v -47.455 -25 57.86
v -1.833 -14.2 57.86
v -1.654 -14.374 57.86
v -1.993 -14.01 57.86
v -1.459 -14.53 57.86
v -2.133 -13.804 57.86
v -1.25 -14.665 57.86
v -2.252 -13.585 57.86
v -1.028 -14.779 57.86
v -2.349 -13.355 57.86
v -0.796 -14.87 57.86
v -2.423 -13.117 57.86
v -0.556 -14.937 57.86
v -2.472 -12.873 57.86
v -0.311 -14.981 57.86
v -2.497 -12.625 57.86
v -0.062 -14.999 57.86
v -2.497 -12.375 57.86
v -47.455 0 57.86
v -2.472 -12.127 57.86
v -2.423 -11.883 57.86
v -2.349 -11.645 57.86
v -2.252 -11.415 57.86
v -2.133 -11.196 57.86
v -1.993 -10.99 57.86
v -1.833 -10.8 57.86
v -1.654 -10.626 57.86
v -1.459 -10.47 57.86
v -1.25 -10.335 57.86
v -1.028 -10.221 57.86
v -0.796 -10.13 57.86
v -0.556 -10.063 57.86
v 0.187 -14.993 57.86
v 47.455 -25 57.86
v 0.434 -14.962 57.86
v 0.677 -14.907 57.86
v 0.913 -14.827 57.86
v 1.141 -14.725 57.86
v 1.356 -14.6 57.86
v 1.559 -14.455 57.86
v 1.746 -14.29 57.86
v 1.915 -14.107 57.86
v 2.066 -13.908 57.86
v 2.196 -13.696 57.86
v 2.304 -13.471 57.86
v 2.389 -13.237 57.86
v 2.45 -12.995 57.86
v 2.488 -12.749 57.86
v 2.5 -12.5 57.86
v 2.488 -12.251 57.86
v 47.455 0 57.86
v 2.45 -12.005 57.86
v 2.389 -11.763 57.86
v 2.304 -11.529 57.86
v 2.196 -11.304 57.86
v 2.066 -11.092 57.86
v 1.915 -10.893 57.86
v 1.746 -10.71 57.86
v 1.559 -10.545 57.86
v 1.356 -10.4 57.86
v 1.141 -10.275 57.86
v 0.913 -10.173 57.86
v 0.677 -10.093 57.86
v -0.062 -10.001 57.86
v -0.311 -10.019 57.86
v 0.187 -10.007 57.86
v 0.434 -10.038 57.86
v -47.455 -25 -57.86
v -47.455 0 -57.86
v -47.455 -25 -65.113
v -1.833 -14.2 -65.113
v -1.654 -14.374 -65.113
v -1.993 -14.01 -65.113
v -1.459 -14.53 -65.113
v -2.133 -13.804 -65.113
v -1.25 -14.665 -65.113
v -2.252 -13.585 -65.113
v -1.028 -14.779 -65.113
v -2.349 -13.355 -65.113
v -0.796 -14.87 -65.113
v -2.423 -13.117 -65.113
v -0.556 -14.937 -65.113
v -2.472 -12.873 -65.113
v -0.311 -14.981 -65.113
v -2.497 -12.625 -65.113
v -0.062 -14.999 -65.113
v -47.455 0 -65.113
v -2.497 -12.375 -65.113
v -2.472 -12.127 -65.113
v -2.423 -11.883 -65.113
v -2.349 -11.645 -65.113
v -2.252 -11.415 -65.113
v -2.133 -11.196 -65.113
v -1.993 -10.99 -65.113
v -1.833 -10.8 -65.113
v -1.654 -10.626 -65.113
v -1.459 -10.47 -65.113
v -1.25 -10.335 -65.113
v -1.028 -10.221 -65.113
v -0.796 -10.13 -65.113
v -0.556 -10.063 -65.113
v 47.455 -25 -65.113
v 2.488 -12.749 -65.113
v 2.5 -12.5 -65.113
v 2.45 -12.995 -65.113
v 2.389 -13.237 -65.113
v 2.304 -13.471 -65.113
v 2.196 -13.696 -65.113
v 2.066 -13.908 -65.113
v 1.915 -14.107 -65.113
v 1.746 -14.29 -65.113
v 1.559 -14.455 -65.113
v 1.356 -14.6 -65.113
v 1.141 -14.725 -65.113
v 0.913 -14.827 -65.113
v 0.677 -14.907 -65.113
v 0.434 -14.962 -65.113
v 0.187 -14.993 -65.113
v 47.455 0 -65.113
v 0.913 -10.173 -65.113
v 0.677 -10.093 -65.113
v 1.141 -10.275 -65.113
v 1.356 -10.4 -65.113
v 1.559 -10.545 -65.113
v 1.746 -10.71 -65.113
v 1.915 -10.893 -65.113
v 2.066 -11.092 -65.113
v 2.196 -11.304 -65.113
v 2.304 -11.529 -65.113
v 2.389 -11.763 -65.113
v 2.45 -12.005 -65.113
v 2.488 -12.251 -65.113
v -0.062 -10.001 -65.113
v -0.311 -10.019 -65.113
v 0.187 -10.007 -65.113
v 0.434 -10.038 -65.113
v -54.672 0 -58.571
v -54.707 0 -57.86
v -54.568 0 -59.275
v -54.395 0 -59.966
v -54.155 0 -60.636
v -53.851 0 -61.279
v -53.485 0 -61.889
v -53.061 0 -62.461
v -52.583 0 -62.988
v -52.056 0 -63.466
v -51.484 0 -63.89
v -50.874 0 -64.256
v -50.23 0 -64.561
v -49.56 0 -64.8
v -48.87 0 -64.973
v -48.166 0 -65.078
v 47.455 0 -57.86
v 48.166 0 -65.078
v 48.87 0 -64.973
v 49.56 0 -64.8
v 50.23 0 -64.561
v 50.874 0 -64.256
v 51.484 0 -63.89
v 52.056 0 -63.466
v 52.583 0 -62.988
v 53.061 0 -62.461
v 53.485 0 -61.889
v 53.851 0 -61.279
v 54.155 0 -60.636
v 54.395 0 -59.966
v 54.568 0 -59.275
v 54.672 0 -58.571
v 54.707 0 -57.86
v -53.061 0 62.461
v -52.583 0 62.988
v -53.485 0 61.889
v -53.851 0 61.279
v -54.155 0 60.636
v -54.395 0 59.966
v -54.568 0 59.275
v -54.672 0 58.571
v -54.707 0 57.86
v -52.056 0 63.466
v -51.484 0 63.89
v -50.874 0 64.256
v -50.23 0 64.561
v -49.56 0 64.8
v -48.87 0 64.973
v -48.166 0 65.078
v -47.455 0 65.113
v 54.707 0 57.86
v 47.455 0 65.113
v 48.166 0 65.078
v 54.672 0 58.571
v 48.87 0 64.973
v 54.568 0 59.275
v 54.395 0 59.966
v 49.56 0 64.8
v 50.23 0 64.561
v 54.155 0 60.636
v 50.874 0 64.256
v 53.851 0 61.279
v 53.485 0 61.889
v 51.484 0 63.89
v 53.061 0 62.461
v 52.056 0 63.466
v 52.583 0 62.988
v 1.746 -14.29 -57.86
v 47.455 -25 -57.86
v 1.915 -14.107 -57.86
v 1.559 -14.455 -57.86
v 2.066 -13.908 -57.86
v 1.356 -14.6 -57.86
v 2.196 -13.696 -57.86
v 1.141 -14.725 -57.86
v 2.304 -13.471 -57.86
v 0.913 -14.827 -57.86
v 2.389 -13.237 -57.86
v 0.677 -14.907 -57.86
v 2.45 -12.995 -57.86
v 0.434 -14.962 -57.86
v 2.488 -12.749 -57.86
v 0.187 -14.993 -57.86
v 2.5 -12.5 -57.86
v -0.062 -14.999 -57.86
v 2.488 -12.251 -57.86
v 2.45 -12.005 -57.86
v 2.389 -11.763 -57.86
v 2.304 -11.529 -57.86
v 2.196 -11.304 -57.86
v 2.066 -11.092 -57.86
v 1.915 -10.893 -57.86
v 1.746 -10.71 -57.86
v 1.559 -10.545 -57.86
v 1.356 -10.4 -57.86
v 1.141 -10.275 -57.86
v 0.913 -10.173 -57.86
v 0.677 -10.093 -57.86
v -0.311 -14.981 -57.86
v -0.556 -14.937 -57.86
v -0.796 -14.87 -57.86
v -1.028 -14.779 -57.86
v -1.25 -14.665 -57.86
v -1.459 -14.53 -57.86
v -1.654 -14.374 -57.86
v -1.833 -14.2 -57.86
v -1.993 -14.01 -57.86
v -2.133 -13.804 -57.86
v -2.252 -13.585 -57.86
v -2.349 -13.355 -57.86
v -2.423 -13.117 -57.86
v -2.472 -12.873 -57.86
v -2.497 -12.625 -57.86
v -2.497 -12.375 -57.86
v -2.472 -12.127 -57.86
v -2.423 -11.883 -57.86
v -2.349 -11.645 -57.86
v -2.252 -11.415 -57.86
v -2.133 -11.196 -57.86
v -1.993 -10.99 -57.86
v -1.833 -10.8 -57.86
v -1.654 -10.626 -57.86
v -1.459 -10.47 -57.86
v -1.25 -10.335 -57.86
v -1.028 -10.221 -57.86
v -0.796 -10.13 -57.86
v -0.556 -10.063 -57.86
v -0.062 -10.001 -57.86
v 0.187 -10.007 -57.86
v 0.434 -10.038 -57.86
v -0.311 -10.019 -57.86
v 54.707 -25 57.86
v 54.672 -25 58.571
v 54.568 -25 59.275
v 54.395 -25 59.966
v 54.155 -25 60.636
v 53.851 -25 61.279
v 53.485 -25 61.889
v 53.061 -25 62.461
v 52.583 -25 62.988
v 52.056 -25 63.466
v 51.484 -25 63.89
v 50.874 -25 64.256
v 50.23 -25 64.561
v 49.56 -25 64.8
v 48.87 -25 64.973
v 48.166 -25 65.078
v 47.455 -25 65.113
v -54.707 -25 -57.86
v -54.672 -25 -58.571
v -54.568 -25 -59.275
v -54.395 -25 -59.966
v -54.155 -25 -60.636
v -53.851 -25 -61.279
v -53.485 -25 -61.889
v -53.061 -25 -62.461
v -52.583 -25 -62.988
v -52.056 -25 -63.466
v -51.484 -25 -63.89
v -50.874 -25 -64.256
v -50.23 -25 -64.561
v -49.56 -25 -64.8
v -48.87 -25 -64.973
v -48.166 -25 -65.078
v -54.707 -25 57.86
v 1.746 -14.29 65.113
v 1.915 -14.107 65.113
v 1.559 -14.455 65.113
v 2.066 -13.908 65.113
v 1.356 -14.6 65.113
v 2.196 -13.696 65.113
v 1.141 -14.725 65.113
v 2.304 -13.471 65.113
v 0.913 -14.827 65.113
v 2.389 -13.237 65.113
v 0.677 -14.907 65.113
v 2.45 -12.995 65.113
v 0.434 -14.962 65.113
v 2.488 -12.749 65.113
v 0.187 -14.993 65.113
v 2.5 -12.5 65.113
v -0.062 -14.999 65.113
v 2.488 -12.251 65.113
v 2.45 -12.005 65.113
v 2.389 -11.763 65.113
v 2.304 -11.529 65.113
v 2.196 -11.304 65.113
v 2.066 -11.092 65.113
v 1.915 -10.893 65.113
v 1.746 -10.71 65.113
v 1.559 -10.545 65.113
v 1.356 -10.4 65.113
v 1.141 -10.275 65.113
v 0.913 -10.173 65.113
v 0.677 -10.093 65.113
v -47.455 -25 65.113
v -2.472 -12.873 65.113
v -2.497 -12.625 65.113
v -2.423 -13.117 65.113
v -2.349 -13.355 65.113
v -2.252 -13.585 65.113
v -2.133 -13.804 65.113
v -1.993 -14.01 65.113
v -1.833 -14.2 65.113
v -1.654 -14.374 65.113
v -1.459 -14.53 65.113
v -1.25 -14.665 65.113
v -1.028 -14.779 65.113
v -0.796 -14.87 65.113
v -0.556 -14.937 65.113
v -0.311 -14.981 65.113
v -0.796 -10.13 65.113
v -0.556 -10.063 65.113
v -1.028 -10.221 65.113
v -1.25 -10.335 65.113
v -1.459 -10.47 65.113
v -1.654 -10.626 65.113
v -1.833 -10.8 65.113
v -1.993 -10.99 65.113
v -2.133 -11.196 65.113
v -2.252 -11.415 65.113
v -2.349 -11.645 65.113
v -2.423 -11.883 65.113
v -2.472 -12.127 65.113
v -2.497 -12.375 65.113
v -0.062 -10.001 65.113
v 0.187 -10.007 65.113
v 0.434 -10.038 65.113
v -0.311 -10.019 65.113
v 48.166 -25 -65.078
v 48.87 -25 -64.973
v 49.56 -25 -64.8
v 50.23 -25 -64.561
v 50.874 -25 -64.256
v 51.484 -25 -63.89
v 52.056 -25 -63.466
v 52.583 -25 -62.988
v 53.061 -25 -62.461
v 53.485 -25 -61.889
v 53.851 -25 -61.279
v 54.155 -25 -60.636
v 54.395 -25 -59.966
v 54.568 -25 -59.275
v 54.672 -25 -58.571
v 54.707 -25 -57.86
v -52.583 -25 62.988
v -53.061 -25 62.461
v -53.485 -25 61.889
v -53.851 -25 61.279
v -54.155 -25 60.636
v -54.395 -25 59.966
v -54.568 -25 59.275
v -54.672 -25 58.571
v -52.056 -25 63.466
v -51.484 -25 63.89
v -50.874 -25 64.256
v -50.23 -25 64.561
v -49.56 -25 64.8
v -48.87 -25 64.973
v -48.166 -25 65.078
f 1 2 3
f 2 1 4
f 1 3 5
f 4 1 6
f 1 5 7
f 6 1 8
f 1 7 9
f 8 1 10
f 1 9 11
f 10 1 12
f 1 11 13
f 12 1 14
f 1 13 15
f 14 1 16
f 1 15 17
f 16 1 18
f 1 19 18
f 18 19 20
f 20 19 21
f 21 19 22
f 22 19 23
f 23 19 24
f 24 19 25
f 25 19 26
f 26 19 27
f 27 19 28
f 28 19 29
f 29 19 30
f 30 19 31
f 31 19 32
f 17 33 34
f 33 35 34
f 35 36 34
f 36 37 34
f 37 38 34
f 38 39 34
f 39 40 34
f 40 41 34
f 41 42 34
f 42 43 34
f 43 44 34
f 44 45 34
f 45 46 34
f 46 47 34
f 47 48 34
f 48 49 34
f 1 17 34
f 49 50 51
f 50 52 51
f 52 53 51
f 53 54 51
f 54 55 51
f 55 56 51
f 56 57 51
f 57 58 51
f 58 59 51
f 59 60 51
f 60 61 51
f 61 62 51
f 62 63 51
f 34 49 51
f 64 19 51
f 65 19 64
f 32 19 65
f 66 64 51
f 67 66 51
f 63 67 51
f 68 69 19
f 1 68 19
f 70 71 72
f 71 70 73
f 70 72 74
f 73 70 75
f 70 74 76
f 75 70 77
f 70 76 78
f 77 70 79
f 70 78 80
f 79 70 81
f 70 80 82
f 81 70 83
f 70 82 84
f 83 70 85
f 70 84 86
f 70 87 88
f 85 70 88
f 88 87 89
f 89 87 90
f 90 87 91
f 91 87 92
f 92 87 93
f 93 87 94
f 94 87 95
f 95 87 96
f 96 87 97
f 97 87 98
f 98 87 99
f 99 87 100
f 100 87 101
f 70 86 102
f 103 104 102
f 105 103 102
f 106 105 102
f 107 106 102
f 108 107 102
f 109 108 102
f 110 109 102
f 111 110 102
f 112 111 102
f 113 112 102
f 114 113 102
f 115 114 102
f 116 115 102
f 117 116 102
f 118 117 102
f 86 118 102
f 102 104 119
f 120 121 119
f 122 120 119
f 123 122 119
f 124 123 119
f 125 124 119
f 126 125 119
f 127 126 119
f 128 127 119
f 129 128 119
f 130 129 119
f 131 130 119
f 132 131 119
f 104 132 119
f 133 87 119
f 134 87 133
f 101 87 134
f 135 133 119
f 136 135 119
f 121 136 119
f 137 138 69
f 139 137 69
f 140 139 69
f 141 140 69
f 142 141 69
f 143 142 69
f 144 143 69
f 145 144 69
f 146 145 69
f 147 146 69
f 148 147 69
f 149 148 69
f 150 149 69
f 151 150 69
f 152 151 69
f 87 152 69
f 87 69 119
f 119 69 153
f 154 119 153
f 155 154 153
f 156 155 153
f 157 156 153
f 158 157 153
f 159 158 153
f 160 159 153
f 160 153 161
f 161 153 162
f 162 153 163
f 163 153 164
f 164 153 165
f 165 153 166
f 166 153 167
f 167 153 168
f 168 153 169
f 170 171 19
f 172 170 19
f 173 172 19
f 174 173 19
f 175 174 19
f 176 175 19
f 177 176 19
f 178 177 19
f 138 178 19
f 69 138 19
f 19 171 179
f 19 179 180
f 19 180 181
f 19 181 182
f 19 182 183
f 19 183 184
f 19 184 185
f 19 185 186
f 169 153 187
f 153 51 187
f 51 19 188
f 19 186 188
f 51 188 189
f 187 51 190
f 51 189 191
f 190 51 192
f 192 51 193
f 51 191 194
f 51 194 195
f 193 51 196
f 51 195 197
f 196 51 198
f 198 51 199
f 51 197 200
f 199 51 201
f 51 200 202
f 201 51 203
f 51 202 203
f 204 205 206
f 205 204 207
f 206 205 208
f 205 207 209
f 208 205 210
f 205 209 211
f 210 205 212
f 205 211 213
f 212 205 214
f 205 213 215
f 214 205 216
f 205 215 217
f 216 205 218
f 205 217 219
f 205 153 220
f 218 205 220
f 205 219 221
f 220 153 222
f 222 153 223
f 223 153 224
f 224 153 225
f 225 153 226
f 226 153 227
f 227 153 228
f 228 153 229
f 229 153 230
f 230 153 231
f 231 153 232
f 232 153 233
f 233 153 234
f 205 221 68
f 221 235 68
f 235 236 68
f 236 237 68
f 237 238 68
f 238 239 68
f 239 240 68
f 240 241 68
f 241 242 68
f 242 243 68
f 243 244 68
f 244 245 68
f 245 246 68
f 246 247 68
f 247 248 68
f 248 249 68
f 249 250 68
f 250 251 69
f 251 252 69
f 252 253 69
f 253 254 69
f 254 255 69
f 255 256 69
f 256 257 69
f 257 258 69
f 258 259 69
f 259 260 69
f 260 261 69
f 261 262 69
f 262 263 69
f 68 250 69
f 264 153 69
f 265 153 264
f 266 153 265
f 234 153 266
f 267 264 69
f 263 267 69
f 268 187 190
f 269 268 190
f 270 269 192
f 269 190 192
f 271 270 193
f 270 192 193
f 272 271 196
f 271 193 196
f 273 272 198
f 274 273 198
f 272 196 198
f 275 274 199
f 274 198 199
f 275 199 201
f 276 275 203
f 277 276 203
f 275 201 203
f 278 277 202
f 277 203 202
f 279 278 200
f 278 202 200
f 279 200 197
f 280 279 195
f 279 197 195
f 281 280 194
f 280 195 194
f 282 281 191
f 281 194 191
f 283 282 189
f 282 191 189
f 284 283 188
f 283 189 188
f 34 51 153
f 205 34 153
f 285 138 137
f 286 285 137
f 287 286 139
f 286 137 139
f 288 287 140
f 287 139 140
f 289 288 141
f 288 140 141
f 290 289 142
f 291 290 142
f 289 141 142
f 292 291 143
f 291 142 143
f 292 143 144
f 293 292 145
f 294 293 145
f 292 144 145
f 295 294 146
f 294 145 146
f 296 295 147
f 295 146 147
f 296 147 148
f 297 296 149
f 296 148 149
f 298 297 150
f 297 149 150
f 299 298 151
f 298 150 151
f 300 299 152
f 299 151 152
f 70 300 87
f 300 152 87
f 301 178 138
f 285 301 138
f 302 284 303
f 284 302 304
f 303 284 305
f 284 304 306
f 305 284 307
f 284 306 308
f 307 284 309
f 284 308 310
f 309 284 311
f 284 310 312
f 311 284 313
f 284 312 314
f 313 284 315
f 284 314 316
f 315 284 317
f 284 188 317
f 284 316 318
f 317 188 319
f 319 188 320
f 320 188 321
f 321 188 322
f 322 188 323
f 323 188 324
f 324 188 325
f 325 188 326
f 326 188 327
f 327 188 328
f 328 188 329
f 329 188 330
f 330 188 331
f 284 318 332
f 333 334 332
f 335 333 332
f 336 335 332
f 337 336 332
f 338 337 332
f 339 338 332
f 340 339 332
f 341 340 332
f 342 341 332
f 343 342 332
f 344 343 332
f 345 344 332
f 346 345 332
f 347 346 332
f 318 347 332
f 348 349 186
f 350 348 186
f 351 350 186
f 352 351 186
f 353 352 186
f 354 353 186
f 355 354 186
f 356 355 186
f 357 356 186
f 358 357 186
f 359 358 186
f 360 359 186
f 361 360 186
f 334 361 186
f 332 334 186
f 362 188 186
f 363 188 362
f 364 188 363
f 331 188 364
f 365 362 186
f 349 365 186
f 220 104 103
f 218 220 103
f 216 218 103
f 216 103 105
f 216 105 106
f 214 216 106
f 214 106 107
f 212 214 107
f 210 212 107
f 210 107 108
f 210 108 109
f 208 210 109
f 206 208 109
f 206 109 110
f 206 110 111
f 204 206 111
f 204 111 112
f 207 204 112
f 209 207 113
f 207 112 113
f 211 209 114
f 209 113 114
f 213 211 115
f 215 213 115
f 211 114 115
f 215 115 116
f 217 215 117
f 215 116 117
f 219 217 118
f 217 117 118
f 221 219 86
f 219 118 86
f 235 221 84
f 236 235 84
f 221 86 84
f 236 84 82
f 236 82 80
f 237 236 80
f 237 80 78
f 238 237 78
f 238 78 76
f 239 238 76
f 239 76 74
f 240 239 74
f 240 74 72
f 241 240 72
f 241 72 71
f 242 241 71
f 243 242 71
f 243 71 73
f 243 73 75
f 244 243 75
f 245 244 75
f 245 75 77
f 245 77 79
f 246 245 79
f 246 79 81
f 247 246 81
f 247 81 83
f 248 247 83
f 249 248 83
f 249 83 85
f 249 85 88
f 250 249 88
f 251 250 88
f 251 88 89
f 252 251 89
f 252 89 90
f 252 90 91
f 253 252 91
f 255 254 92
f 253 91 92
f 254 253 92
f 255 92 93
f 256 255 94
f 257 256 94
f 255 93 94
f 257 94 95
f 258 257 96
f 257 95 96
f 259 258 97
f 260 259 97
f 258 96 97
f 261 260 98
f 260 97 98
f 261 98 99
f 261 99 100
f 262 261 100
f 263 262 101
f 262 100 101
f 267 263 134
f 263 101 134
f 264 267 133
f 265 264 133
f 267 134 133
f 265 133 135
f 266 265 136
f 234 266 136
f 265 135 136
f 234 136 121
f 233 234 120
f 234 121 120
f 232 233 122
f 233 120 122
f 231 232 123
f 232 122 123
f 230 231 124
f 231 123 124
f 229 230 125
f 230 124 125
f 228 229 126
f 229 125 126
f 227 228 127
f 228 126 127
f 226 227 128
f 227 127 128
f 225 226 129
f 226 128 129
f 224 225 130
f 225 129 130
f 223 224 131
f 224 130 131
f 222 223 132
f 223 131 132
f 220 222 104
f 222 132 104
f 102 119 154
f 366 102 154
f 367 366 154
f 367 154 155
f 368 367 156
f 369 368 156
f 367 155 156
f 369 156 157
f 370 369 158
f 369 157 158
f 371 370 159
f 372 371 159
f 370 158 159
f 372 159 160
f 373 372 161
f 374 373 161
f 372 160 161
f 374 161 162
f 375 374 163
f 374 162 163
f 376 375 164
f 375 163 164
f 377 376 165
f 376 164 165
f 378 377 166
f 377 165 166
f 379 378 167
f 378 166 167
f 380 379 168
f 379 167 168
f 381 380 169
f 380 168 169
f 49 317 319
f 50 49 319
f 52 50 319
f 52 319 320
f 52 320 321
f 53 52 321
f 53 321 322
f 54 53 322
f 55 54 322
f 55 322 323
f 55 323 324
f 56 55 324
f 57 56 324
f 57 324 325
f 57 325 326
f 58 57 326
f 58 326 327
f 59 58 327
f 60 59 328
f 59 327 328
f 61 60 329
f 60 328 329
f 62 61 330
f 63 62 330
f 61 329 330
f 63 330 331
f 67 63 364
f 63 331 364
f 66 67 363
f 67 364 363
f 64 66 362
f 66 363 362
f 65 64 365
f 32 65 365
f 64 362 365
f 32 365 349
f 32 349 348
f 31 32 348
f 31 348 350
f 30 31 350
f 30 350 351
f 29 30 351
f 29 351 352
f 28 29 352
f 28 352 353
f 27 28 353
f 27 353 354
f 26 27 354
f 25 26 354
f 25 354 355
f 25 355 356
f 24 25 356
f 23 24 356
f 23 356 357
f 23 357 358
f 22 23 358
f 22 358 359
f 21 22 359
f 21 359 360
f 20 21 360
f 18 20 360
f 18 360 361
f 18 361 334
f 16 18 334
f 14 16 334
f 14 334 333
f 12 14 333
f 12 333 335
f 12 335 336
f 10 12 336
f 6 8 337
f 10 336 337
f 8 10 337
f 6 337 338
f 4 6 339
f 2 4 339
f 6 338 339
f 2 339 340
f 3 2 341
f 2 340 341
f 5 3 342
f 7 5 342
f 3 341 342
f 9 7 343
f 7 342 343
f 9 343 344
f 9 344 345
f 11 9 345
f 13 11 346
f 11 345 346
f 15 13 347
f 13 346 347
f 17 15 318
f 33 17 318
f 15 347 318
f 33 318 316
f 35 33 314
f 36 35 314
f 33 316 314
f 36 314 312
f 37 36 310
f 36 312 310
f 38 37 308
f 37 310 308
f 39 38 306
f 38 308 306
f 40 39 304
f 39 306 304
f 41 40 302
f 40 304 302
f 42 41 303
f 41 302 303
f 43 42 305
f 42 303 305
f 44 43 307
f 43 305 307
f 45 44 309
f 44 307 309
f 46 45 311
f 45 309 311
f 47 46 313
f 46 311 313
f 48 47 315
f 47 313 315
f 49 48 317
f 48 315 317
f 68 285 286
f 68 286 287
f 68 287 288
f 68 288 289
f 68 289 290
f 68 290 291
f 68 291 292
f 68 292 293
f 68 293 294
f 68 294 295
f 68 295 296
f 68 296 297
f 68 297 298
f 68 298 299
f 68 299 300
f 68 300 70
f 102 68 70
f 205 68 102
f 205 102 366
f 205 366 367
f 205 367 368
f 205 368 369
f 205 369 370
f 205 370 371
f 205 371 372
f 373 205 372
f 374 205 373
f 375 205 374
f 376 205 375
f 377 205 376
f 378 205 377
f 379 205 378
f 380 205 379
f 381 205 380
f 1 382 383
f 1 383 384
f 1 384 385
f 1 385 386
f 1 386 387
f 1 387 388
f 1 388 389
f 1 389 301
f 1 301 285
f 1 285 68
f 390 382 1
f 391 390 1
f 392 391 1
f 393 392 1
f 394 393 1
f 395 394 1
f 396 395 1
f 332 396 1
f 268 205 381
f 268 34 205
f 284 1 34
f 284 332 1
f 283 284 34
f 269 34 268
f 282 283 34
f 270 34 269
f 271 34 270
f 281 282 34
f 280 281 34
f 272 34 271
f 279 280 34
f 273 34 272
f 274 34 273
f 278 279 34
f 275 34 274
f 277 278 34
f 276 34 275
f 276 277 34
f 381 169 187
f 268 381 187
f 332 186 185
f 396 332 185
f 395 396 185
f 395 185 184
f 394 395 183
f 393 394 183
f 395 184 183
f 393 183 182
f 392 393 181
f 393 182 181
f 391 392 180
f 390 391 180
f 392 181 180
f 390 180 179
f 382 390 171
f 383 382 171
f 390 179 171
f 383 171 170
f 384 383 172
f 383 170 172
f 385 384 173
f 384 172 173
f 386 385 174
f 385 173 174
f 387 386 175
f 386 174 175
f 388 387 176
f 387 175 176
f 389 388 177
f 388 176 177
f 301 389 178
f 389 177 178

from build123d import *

# Parameters (mm, degrees)
F1_DEPTH = 25
F3_R     = 2.5
F4_DEPTH = 25
F2_R     = 2.5
F5_DEPTH = 25


# Not quite as in the source:
# - ends of sketch curves that miss each other by under 0.0002 mm in the source are joined


with BuildPart() as f1:
    # F0 (on Front) → F1 (new body)
    with BuildSketch(Plane.XZ):
        with BuildLine():
            Line((-47.4549531937, 57.8603595495), (47.4549531937, 57.8603595495))
            Line((47.4549531937, 57.8603595495), (47.4549531937, 65.1126131415))
            Line((47.4549531937, 65.1126131415), (-47.4549531937, 65.1126131415))
            ThreePointArc((-47.4549531937, 65.1126131415), (-52.5830735216, 62.9884798775), (-54.707210511, 57.8603595495))
            Line((-54.707210511, 57.8603595495), (-54.7072067857, -57.8603595495))
            ThreePointArc((-54.7072067857, -57.8603595495), (-52.5830708875, -62.9884772433), (-47.4549531937, -65.1126131415))
            Line((-47.4549531937, -65.1126131415), (-47.4549531937, -57.8603595495))
            Line((-47.4549531937, -57.8603595495), (-47.4549531937, 57.8603595495))
        make_face()
        with BuildLine():
            Line((47.4549531937, 65.1126131415), (47.4549531937, 57.8603595495))
            Line((47.4549531937, 57.8603595495), (47.4549531937, -57.8603595495))
            Line((47.4549531937, -57.8603595495), (-47.4549531937, -57.8603595495))
            Line((-47.4549531937, -57.8603595495), (-47.4549531937, -65.1126131415))
            Line((-47.4549531937, -65.1126131415), (47.4549531937, -65.1126131415))
            ThreePointArc((47.4549531937, -65.1126131415), (52.5830735216, -62.9884798775), (54.707210511, -57.8603595495))
            Line((54.707210511, -57.8603595495), (54.7072067857, 57.8603595495))
            ThreePointArc((54.7072067857, 57.8603595495), (52.5830708875, 62.9884772433), (47.4549531937, 65.1126131415))
        make_face()
    extrude(amount=F1_DEPTH)

    # F3 (on face) → F4 (cut)
    with BuildSketch(Plane(origin=(0, 0, -65.1126131415), x_dir=(1, 0, 0), z_dir=(0, 0, -1))):
        with Locations((0, 12.5)):
            Circle(F3_R)
    extrude(amount=-F4_DEPTH, mode=Mode.SUBTRACT)

    # F2 (on face) → F5 (cut)
    with BuildSketch(Plane.XY.offset(65.1126131415)):
        with Locations((0, -12.5)):
            Circle(F2_R)
    extrude(amount=-F5_DEPTH, mode=Mode.SUBTRACT)


solid = f1.part
